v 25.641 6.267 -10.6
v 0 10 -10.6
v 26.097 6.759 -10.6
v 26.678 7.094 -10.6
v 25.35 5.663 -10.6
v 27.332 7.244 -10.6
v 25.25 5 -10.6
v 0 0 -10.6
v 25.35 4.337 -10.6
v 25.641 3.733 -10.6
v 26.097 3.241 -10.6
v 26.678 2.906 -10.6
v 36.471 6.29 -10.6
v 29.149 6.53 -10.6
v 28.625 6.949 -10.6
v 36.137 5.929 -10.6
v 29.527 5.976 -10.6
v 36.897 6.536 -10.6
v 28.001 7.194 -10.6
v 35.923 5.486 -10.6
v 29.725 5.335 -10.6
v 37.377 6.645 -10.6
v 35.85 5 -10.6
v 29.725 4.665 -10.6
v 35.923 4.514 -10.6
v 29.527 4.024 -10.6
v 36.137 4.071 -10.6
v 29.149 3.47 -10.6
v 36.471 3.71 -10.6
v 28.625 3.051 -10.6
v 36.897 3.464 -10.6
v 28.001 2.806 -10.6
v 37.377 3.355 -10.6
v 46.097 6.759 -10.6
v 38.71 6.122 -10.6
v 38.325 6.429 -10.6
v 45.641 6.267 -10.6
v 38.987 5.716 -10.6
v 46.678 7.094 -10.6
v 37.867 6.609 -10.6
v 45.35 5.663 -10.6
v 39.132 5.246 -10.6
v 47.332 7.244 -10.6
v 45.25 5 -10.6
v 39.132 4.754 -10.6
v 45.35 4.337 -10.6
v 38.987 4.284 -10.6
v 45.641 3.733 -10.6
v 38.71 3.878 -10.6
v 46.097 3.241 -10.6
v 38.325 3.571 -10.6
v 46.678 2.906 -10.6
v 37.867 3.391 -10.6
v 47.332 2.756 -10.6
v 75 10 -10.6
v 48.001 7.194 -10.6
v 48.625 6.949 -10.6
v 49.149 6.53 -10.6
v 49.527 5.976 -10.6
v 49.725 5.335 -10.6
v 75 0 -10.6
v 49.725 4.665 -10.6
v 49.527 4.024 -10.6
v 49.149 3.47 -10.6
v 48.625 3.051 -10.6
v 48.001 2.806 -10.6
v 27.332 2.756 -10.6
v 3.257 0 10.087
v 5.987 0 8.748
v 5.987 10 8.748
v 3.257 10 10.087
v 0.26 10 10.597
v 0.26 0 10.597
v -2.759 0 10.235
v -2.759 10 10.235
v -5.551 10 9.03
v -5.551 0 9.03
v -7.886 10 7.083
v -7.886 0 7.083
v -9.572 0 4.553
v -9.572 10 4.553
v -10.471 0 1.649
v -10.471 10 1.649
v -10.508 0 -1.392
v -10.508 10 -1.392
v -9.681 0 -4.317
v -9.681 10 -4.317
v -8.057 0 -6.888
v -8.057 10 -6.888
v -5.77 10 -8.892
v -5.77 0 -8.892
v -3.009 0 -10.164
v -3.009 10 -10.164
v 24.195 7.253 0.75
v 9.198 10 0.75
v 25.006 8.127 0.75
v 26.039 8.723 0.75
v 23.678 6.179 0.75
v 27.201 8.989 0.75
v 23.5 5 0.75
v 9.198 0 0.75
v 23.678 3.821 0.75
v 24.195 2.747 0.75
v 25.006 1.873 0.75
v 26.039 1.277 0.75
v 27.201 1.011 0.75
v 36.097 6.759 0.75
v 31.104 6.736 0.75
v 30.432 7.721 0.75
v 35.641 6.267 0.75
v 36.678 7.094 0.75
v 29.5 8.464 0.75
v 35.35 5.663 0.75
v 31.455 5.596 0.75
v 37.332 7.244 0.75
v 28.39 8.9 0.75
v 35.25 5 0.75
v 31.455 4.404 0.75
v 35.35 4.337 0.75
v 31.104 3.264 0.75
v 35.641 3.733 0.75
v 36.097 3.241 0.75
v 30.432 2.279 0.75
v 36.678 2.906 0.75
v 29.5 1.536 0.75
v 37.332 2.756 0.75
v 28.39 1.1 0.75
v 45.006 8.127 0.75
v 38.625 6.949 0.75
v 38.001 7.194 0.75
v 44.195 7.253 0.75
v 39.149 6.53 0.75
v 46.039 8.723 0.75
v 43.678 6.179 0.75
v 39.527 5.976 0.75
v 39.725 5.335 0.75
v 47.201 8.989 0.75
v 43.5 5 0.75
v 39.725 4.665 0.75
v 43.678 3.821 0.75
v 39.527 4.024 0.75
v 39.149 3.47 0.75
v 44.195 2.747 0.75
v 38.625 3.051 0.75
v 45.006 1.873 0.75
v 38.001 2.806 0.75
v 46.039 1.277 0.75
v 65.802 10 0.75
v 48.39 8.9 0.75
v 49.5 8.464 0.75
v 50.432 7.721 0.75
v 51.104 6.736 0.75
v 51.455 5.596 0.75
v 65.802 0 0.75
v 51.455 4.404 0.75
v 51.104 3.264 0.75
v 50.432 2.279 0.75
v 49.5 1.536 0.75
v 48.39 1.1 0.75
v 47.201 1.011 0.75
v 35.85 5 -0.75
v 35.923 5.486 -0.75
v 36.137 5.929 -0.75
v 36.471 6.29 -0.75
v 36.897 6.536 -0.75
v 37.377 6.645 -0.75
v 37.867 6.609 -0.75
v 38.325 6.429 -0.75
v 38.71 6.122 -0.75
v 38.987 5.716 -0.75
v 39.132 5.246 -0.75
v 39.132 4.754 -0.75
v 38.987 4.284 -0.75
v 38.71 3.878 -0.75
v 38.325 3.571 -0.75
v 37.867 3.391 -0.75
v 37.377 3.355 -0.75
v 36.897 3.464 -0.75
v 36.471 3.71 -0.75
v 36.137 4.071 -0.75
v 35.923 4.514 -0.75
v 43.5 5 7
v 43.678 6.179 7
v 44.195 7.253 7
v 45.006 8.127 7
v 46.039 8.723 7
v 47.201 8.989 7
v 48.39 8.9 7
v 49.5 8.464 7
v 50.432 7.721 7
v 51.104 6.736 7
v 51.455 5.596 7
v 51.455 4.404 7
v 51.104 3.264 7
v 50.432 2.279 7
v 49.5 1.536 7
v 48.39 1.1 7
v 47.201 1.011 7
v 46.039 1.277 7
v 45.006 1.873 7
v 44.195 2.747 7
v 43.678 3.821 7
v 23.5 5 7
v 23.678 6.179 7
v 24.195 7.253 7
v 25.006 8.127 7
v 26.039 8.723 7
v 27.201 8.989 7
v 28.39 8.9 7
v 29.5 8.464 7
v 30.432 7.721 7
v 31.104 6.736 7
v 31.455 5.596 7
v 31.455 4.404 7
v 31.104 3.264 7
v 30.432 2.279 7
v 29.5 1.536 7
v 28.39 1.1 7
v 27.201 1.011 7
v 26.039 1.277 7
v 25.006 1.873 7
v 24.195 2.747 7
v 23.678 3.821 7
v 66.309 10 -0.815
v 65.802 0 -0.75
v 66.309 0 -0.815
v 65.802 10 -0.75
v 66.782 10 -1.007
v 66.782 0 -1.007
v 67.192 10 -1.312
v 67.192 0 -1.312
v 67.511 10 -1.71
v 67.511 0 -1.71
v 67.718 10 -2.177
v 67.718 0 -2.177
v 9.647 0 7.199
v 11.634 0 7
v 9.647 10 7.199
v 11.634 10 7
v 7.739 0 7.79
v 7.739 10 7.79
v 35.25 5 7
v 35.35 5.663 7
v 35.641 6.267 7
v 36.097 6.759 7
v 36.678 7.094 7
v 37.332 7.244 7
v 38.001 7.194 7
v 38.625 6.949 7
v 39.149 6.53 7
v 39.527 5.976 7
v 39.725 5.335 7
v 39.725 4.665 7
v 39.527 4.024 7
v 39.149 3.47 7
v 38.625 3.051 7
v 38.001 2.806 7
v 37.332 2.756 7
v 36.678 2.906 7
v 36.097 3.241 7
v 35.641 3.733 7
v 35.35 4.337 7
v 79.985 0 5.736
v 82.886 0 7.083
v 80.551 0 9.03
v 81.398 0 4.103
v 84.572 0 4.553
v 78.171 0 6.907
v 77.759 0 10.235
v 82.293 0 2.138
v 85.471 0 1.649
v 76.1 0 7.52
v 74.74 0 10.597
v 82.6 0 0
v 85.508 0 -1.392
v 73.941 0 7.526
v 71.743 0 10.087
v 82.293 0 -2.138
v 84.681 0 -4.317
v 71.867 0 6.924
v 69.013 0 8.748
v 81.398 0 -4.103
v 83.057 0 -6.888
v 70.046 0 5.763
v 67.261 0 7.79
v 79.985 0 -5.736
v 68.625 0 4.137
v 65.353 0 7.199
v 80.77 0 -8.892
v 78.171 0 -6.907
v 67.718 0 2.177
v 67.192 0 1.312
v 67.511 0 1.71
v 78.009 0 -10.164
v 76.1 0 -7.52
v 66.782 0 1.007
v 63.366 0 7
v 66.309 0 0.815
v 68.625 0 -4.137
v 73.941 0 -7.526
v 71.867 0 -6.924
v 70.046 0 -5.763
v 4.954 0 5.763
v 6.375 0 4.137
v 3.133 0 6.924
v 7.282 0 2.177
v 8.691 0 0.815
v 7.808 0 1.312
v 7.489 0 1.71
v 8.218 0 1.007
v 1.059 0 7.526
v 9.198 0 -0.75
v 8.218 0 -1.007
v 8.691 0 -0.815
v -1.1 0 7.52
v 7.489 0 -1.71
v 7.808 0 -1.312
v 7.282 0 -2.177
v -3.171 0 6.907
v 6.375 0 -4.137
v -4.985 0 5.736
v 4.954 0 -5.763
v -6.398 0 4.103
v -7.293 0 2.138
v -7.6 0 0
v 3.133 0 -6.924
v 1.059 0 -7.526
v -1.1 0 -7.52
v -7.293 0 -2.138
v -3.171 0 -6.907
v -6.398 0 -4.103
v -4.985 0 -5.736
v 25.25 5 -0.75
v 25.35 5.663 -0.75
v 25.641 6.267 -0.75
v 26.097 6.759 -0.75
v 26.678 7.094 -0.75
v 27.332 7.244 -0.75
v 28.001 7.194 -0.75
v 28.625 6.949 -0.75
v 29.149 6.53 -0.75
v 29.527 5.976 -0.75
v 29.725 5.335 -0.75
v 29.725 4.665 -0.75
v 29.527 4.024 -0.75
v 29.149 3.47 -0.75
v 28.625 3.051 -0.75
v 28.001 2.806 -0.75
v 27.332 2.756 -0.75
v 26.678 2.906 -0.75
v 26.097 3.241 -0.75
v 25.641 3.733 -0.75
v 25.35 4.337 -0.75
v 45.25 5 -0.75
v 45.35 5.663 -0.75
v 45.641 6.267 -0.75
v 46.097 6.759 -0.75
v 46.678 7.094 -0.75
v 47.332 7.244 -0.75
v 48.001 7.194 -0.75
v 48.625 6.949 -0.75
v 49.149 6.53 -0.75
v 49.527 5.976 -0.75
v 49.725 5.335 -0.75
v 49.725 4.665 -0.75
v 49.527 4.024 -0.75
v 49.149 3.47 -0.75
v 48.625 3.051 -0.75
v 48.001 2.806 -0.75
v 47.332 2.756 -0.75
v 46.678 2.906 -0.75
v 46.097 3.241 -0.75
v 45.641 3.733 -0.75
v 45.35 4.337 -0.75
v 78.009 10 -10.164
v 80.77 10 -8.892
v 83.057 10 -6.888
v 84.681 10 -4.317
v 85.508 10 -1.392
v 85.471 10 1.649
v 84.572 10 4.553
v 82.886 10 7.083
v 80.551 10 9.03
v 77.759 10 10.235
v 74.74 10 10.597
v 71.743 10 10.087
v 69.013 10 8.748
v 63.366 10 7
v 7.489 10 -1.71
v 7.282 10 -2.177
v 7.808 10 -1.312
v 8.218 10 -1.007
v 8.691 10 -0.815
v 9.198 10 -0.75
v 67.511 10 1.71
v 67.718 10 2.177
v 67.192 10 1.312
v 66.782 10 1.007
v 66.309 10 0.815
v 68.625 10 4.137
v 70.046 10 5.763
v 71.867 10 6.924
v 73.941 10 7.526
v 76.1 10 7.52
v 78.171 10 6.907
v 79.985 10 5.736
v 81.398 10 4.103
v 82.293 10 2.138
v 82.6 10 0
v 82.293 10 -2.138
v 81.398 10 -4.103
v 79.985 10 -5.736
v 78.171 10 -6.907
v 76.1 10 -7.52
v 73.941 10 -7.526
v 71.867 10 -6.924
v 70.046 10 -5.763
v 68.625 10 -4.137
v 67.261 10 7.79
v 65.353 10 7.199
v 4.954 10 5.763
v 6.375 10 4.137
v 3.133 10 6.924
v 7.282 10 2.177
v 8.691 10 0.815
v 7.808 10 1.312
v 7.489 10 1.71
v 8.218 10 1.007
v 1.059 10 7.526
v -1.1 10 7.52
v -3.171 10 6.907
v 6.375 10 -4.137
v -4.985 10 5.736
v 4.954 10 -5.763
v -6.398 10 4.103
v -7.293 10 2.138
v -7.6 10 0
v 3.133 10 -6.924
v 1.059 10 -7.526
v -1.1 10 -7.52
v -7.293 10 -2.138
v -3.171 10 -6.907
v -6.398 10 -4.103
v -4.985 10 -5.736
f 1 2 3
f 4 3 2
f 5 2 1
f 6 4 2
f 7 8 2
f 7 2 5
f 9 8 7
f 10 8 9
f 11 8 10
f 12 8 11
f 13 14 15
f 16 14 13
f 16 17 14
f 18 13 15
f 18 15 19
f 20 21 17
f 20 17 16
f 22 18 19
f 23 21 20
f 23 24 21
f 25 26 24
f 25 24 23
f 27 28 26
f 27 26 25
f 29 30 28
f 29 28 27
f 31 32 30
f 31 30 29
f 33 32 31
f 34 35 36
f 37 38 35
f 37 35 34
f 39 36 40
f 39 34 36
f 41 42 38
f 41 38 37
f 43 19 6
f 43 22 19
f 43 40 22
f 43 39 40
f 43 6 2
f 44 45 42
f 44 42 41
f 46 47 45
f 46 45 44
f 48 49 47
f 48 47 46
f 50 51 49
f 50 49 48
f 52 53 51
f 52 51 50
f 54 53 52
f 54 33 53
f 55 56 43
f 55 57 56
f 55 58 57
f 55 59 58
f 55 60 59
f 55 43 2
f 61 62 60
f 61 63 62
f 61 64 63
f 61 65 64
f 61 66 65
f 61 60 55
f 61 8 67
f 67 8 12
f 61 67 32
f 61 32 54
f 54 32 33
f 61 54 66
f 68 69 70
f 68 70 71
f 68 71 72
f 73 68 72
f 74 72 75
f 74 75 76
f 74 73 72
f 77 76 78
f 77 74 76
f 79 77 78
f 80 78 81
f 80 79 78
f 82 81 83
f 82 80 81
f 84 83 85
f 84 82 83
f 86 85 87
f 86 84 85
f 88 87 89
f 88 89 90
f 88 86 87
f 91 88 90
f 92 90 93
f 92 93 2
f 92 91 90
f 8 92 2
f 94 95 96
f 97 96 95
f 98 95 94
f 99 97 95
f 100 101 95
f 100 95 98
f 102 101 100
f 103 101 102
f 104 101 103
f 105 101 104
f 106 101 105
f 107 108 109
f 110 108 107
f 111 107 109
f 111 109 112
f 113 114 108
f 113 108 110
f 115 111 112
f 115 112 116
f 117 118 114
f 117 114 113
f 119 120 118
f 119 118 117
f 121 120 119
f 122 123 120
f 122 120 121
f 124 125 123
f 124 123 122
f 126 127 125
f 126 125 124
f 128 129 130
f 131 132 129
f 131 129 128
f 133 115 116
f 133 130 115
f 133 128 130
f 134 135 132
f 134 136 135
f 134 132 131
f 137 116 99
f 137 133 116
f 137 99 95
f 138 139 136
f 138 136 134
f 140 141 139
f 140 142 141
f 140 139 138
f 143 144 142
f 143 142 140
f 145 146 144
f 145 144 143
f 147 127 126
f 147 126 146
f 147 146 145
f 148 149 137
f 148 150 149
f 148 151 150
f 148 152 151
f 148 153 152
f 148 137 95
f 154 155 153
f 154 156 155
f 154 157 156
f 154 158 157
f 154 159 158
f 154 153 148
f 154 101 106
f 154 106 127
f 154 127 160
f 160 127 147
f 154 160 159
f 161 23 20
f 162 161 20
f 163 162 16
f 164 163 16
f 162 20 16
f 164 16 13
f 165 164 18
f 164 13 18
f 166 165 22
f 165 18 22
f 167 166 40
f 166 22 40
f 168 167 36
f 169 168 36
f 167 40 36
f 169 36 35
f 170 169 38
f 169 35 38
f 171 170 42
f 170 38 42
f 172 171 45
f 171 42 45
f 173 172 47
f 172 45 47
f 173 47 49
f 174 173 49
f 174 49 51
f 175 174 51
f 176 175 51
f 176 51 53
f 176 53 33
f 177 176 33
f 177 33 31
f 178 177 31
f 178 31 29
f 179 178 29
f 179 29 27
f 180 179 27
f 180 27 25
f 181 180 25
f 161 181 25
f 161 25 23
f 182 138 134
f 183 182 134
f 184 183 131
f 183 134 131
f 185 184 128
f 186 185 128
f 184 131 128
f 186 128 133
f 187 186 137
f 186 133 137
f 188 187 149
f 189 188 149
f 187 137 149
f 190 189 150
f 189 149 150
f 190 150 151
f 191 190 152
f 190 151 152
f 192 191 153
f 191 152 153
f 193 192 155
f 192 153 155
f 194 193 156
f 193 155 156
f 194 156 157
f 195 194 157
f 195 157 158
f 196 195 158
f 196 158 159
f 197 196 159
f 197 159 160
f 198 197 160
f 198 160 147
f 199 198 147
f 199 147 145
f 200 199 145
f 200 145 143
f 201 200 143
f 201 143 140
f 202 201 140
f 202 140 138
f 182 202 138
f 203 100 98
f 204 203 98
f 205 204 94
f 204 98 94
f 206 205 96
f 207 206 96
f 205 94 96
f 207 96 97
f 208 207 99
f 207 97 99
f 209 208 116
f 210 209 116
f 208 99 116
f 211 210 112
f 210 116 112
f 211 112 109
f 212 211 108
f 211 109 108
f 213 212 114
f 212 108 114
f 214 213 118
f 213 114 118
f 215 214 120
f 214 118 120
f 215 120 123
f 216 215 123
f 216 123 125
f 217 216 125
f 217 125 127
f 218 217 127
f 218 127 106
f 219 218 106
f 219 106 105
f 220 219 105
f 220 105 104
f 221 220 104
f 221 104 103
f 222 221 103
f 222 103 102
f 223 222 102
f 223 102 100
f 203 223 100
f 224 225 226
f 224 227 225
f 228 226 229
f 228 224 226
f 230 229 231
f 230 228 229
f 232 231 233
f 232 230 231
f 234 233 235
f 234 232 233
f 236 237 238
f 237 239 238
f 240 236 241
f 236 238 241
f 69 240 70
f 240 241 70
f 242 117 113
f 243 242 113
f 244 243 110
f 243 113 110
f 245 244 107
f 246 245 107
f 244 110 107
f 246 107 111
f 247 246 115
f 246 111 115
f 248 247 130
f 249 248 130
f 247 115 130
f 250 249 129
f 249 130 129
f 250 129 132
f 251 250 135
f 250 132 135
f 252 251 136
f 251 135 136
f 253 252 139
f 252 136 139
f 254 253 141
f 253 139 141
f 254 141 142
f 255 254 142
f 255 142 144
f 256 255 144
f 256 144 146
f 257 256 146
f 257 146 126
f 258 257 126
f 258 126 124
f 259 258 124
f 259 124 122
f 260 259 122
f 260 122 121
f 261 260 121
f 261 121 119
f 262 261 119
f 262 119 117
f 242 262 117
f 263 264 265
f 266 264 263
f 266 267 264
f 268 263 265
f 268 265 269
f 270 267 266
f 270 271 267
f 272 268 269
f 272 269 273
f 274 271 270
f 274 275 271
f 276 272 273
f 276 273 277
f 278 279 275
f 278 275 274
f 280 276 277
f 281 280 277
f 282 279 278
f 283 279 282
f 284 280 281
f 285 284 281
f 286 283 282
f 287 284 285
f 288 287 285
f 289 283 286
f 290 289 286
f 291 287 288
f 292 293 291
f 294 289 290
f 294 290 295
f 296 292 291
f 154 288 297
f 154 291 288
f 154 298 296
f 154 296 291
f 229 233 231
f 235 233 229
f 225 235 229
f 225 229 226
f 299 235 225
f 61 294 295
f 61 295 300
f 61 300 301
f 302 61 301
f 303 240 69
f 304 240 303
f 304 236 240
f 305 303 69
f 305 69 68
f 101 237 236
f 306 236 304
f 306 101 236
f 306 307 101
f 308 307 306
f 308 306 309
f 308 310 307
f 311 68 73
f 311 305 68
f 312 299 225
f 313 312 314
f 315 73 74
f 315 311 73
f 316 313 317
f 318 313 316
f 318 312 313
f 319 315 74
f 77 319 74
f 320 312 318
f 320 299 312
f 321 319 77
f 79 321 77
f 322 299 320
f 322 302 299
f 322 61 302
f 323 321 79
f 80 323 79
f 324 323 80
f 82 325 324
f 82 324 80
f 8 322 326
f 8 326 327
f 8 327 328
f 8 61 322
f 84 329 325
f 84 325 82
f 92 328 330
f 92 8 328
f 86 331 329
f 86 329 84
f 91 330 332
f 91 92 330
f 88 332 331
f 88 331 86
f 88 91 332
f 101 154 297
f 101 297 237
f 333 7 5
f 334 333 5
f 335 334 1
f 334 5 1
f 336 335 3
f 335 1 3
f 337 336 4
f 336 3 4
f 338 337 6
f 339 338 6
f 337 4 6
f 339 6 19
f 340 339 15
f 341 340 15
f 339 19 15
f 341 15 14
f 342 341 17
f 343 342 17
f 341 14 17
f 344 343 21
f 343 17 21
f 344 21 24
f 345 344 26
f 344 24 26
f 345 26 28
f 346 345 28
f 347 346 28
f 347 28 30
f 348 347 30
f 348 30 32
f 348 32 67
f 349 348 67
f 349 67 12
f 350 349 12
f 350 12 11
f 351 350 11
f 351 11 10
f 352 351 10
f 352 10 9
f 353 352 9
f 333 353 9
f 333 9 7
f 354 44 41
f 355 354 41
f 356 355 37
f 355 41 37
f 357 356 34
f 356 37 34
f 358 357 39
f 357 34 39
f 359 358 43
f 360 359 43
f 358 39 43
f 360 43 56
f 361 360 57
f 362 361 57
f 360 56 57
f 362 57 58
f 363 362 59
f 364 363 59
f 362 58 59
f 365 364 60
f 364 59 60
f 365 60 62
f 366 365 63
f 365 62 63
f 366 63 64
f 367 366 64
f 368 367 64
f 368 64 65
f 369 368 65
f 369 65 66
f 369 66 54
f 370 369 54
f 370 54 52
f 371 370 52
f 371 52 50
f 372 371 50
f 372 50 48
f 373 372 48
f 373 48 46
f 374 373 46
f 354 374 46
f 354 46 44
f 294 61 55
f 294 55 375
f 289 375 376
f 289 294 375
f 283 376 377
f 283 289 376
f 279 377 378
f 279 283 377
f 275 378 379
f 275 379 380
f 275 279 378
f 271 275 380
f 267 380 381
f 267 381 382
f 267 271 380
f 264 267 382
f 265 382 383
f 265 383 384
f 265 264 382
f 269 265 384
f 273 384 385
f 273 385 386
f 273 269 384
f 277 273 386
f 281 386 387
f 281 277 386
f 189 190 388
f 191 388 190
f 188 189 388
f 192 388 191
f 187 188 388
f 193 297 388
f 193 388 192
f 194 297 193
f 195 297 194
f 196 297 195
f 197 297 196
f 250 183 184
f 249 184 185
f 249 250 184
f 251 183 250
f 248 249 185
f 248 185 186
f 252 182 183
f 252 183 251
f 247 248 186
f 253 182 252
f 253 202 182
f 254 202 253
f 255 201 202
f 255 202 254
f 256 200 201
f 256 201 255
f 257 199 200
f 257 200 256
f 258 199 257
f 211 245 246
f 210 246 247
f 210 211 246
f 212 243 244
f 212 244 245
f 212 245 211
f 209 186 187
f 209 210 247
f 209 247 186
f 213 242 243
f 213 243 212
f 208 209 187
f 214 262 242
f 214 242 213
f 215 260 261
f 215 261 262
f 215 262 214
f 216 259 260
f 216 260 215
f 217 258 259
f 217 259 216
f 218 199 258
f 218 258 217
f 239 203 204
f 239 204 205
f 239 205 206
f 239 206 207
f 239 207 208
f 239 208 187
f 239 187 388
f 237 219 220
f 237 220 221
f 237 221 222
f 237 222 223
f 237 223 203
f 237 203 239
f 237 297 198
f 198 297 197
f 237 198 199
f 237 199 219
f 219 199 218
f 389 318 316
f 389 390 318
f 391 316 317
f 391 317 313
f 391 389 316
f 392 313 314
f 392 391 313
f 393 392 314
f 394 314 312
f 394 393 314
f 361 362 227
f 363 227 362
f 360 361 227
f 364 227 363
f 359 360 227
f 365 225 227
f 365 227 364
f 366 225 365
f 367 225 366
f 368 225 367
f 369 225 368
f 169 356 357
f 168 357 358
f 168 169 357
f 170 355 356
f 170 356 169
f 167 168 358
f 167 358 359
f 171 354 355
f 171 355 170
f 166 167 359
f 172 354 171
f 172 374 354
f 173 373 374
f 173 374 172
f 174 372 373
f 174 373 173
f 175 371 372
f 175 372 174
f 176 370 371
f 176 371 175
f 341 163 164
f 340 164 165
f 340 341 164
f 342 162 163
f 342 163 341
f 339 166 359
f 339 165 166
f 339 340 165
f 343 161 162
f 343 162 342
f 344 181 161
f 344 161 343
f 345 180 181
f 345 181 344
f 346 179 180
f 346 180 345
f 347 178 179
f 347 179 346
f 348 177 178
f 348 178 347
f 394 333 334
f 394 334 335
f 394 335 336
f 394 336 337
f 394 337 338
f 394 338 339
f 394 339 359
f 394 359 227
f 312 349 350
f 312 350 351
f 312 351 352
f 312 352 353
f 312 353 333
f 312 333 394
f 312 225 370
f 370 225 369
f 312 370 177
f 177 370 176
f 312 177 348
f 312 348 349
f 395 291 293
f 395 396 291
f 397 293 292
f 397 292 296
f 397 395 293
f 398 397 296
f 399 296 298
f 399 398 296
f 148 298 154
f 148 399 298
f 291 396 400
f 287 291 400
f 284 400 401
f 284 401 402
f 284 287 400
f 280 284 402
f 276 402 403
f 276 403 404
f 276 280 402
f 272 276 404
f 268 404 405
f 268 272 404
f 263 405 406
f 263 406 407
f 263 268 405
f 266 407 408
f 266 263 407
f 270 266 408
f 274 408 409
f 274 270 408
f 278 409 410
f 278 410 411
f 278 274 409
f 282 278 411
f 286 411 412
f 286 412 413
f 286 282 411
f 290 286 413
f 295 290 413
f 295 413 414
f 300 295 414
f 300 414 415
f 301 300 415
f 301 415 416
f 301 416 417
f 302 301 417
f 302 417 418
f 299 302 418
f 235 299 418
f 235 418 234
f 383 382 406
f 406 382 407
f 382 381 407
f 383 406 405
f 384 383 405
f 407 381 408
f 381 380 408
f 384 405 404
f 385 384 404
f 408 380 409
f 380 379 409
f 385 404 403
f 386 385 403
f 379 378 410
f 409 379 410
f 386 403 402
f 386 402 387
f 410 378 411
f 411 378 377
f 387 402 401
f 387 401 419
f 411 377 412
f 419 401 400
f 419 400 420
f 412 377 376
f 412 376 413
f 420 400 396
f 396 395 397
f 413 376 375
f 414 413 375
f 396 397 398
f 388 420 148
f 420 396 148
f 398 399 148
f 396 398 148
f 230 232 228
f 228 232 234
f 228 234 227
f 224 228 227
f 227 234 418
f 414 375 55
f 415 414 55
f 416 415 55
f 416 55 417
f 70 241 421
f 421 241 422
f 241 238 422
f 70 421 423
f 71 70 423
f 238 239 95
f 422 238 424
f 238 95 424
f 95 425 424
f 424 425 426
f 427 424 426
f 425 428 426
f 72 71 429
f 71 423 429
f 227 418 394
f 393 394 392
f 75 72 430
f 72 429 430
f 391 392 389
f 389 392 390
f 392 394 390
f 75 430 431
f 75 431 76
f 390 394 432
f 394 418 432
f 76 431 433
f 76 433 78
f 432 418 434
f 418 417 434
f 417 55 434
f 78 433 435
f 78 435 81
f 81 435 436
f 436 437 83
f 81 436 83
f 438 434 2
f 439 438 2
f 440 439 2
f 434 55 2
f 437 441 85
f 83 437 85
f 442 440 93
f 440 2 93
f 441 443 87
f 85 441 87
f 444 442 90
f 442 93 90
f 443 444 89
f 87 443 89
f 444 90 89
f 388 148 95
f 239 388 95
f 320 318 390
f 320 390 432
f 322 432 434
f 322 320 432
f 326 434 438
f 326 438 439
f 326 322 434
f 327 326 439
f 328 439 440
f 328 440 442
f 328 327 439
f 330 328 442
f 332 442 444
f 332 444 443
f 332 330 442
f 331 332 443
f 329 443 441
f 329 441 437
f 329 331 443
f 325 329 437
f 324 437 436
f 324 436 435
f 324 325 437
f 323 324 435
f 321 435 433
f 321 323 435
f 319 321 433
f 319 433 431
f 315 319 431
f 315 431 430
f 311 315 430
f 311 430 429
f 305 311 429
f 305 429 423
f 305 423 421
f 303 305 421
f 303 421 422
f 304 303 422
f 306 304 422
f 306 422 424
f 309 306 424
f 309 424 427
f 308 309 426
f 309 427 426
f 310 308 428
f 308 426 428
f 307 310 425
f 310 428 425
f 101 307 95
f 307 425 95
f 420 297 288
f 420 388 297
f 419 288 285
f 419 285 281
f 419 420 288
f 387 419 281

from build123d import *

# Parameters (mm, degrees)
EXTRUDE_1_DEPTH           = 10
HOLE_WIZARD_8_0_8_1_D     = 8
HOLE_WIZARD_8_0_8_1_DEPTH = 6.25
HOLE_WIZARD_M41_D         = 4.5
HOLE_WIZARD_M41_DEPTH     = 11
HOLE_WIZARD_M41_TIP       = 1.351936393
HOLE_WIZARD_M42_D         = 4.5
HOLE_WIZARD_M42_DEPTH     = 6.25
M4X0_72_D                 = 3.3
FILLET_2_R                = 10
FILLET_3_R                = 2


with BuildPart() as part:
    # Эскиз1 → Бобышка-Вытянуть1 (new body)
    with BuildSketch(Plane(origin=(0, 0, 0), x_dir=(1, 0, 0), z_dir=(0, 1, 0))):
        with BuildLine():
            Line((67.040100503, -7), (7.959899497, -7))
            ThreePointArc((7.959899497, -7), (-9.658157174, -4.368065934), (0, 10.6))
            Line((0, 10.6), (75, 10.6))
            ThreePointArc((75, 10.6), (84.658157174, -4.368065934), (67.040100503, -7))
        make_face()
        with BuildLine():
            Line((7.562902882, -0.75), (67.437097118, -0.75))
            ThreePointArc((67.437097118, -0.75), (82.6, 0), (67.437097118, 0.75))
            Line((67.437097118, 0.75), (7.562902882, 0.75))
            ThreePointArc((7.562902882, 0.75), (-7.6, 0), (7.562902882, -0.75))
        make_face(mode=Mode.SUBTRACT)
    extrude(amount=EXTRUDE_1_DEPTH)

    # Диаметр отверстия Ø8.0 (8)1
    with Locations(Plane.XY.offset(7)):
        with Locations((27.5, 5), (47.5, 5)):
            Hole(HOLE_WIZARD_8_0_8_1_D / 2, depth=HOLE_WIZARD_8_0_8_1_DEPTH)

    # Отверстие с зазором M41
    with Locations(Plane.XY.offset(-0.75)):
        with Locations((47.5, 5), (27.5, 5)):
            Hole(HOLE_WIZARD_M41_D / 2, depth=HOLE_WIZARD_M41_DEPTH)
            with Locations((0, 0, -(HOLE_WIZARD_M41_DEPTH + HOLE_WIZARD_M41_TIP / 2))):  # 118° drill point
                Cone(0, HOLE_WIZARD_M41_D / 2, HOLE_WIZARD_M41_TIP, mode=Mode.SUBTRACT)

    # Отверстие с зазором M42
    with Locations(Plane.XY.offset(7)):
        with Locations((37.5, 5)):
            Hole(HOLE_WIZARD_M42_D / 2, depth=HOLE_WIZARD_M42_DEPTH)

    # Отверстие обработанное метчиком M4x0.72 (through all)
    with Locations(Plane.XY.offset(-0.75)):
        with Locations((37.5, 5)):
            Hole(M4X0_72_D / 2)

    # Скругление2
    fillet_2_edges = [part.edges().sort_by_distance(p)[0] for p in [
        (67.040100503, 5, 7),
        (7.959899497, 5, 7),
    ]]
    fillet(fillet_2_edges, radius=FILLET_2_R)

    # Скругление3
    fillet_3_edges = [part.edges().sort_by_distance(p)[0] for p in [
        (7.562902882, 5, -0.75),
        (7.562902882, 5, 0.75),
        (67.437097118, 5, 0.75),
        (67.437097118, 5, -0.75),
    ]]
    fillet(fillet_3_edges, radius=FILLET_3_R)


solid = part.part
